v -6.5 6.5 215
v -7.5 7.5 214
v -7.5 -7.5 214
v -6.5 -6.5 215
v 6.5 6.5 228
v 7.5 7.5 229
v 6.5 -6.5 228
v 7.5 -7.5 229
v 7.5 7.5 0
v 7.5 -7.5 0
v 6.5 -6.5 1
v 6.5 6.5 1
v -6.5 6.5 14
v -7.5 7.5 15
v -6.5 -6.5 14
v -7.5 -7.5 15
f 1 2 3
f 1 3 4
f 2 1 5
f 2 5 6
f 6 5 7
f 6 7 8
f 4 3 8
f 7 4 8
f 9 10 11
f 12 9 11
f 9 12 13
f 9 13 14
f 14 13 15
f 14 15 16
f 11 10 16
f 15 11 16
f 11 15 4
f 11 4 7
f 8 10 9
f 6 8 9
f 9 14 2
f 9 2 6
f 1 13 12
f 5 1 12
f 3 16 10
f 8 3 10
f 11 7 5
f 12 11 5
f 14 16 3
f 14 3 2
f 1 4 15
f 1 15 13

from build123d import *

# Parameters (mm, degrees)
F1_W     = 15
F1_H     = 15
F1_W_2   = 13
F1_H_2   = 13
F2_DEPTH = 229
F4_DEPTH = 25


with BuildPart() as f2:
    # F1 (on Top) → F2 (new body)
    with BuildSketch(Plane.XY):
        Rectangle(F1_W, F1_H)
        Rectangle(F1_W_2, F1_H_2, mode=Mode.SUBTRACT)
    extrude(amount=F2_DEPTH)

    # F3 (on face) → F4 (cut)
    with BuildSketch(Plane.XZ.offset(7.5)):
        Polygon((7.5, 0), (-7.5, 15), (-7.5, 0), align=None)
        Polygon((7.5, 229), (-7.5, 229), (-7.5, 214), align=None)
    extrude(amount=-F4_DEPTH, mode=Mode.SUBTRACT)


solid = f2.part
